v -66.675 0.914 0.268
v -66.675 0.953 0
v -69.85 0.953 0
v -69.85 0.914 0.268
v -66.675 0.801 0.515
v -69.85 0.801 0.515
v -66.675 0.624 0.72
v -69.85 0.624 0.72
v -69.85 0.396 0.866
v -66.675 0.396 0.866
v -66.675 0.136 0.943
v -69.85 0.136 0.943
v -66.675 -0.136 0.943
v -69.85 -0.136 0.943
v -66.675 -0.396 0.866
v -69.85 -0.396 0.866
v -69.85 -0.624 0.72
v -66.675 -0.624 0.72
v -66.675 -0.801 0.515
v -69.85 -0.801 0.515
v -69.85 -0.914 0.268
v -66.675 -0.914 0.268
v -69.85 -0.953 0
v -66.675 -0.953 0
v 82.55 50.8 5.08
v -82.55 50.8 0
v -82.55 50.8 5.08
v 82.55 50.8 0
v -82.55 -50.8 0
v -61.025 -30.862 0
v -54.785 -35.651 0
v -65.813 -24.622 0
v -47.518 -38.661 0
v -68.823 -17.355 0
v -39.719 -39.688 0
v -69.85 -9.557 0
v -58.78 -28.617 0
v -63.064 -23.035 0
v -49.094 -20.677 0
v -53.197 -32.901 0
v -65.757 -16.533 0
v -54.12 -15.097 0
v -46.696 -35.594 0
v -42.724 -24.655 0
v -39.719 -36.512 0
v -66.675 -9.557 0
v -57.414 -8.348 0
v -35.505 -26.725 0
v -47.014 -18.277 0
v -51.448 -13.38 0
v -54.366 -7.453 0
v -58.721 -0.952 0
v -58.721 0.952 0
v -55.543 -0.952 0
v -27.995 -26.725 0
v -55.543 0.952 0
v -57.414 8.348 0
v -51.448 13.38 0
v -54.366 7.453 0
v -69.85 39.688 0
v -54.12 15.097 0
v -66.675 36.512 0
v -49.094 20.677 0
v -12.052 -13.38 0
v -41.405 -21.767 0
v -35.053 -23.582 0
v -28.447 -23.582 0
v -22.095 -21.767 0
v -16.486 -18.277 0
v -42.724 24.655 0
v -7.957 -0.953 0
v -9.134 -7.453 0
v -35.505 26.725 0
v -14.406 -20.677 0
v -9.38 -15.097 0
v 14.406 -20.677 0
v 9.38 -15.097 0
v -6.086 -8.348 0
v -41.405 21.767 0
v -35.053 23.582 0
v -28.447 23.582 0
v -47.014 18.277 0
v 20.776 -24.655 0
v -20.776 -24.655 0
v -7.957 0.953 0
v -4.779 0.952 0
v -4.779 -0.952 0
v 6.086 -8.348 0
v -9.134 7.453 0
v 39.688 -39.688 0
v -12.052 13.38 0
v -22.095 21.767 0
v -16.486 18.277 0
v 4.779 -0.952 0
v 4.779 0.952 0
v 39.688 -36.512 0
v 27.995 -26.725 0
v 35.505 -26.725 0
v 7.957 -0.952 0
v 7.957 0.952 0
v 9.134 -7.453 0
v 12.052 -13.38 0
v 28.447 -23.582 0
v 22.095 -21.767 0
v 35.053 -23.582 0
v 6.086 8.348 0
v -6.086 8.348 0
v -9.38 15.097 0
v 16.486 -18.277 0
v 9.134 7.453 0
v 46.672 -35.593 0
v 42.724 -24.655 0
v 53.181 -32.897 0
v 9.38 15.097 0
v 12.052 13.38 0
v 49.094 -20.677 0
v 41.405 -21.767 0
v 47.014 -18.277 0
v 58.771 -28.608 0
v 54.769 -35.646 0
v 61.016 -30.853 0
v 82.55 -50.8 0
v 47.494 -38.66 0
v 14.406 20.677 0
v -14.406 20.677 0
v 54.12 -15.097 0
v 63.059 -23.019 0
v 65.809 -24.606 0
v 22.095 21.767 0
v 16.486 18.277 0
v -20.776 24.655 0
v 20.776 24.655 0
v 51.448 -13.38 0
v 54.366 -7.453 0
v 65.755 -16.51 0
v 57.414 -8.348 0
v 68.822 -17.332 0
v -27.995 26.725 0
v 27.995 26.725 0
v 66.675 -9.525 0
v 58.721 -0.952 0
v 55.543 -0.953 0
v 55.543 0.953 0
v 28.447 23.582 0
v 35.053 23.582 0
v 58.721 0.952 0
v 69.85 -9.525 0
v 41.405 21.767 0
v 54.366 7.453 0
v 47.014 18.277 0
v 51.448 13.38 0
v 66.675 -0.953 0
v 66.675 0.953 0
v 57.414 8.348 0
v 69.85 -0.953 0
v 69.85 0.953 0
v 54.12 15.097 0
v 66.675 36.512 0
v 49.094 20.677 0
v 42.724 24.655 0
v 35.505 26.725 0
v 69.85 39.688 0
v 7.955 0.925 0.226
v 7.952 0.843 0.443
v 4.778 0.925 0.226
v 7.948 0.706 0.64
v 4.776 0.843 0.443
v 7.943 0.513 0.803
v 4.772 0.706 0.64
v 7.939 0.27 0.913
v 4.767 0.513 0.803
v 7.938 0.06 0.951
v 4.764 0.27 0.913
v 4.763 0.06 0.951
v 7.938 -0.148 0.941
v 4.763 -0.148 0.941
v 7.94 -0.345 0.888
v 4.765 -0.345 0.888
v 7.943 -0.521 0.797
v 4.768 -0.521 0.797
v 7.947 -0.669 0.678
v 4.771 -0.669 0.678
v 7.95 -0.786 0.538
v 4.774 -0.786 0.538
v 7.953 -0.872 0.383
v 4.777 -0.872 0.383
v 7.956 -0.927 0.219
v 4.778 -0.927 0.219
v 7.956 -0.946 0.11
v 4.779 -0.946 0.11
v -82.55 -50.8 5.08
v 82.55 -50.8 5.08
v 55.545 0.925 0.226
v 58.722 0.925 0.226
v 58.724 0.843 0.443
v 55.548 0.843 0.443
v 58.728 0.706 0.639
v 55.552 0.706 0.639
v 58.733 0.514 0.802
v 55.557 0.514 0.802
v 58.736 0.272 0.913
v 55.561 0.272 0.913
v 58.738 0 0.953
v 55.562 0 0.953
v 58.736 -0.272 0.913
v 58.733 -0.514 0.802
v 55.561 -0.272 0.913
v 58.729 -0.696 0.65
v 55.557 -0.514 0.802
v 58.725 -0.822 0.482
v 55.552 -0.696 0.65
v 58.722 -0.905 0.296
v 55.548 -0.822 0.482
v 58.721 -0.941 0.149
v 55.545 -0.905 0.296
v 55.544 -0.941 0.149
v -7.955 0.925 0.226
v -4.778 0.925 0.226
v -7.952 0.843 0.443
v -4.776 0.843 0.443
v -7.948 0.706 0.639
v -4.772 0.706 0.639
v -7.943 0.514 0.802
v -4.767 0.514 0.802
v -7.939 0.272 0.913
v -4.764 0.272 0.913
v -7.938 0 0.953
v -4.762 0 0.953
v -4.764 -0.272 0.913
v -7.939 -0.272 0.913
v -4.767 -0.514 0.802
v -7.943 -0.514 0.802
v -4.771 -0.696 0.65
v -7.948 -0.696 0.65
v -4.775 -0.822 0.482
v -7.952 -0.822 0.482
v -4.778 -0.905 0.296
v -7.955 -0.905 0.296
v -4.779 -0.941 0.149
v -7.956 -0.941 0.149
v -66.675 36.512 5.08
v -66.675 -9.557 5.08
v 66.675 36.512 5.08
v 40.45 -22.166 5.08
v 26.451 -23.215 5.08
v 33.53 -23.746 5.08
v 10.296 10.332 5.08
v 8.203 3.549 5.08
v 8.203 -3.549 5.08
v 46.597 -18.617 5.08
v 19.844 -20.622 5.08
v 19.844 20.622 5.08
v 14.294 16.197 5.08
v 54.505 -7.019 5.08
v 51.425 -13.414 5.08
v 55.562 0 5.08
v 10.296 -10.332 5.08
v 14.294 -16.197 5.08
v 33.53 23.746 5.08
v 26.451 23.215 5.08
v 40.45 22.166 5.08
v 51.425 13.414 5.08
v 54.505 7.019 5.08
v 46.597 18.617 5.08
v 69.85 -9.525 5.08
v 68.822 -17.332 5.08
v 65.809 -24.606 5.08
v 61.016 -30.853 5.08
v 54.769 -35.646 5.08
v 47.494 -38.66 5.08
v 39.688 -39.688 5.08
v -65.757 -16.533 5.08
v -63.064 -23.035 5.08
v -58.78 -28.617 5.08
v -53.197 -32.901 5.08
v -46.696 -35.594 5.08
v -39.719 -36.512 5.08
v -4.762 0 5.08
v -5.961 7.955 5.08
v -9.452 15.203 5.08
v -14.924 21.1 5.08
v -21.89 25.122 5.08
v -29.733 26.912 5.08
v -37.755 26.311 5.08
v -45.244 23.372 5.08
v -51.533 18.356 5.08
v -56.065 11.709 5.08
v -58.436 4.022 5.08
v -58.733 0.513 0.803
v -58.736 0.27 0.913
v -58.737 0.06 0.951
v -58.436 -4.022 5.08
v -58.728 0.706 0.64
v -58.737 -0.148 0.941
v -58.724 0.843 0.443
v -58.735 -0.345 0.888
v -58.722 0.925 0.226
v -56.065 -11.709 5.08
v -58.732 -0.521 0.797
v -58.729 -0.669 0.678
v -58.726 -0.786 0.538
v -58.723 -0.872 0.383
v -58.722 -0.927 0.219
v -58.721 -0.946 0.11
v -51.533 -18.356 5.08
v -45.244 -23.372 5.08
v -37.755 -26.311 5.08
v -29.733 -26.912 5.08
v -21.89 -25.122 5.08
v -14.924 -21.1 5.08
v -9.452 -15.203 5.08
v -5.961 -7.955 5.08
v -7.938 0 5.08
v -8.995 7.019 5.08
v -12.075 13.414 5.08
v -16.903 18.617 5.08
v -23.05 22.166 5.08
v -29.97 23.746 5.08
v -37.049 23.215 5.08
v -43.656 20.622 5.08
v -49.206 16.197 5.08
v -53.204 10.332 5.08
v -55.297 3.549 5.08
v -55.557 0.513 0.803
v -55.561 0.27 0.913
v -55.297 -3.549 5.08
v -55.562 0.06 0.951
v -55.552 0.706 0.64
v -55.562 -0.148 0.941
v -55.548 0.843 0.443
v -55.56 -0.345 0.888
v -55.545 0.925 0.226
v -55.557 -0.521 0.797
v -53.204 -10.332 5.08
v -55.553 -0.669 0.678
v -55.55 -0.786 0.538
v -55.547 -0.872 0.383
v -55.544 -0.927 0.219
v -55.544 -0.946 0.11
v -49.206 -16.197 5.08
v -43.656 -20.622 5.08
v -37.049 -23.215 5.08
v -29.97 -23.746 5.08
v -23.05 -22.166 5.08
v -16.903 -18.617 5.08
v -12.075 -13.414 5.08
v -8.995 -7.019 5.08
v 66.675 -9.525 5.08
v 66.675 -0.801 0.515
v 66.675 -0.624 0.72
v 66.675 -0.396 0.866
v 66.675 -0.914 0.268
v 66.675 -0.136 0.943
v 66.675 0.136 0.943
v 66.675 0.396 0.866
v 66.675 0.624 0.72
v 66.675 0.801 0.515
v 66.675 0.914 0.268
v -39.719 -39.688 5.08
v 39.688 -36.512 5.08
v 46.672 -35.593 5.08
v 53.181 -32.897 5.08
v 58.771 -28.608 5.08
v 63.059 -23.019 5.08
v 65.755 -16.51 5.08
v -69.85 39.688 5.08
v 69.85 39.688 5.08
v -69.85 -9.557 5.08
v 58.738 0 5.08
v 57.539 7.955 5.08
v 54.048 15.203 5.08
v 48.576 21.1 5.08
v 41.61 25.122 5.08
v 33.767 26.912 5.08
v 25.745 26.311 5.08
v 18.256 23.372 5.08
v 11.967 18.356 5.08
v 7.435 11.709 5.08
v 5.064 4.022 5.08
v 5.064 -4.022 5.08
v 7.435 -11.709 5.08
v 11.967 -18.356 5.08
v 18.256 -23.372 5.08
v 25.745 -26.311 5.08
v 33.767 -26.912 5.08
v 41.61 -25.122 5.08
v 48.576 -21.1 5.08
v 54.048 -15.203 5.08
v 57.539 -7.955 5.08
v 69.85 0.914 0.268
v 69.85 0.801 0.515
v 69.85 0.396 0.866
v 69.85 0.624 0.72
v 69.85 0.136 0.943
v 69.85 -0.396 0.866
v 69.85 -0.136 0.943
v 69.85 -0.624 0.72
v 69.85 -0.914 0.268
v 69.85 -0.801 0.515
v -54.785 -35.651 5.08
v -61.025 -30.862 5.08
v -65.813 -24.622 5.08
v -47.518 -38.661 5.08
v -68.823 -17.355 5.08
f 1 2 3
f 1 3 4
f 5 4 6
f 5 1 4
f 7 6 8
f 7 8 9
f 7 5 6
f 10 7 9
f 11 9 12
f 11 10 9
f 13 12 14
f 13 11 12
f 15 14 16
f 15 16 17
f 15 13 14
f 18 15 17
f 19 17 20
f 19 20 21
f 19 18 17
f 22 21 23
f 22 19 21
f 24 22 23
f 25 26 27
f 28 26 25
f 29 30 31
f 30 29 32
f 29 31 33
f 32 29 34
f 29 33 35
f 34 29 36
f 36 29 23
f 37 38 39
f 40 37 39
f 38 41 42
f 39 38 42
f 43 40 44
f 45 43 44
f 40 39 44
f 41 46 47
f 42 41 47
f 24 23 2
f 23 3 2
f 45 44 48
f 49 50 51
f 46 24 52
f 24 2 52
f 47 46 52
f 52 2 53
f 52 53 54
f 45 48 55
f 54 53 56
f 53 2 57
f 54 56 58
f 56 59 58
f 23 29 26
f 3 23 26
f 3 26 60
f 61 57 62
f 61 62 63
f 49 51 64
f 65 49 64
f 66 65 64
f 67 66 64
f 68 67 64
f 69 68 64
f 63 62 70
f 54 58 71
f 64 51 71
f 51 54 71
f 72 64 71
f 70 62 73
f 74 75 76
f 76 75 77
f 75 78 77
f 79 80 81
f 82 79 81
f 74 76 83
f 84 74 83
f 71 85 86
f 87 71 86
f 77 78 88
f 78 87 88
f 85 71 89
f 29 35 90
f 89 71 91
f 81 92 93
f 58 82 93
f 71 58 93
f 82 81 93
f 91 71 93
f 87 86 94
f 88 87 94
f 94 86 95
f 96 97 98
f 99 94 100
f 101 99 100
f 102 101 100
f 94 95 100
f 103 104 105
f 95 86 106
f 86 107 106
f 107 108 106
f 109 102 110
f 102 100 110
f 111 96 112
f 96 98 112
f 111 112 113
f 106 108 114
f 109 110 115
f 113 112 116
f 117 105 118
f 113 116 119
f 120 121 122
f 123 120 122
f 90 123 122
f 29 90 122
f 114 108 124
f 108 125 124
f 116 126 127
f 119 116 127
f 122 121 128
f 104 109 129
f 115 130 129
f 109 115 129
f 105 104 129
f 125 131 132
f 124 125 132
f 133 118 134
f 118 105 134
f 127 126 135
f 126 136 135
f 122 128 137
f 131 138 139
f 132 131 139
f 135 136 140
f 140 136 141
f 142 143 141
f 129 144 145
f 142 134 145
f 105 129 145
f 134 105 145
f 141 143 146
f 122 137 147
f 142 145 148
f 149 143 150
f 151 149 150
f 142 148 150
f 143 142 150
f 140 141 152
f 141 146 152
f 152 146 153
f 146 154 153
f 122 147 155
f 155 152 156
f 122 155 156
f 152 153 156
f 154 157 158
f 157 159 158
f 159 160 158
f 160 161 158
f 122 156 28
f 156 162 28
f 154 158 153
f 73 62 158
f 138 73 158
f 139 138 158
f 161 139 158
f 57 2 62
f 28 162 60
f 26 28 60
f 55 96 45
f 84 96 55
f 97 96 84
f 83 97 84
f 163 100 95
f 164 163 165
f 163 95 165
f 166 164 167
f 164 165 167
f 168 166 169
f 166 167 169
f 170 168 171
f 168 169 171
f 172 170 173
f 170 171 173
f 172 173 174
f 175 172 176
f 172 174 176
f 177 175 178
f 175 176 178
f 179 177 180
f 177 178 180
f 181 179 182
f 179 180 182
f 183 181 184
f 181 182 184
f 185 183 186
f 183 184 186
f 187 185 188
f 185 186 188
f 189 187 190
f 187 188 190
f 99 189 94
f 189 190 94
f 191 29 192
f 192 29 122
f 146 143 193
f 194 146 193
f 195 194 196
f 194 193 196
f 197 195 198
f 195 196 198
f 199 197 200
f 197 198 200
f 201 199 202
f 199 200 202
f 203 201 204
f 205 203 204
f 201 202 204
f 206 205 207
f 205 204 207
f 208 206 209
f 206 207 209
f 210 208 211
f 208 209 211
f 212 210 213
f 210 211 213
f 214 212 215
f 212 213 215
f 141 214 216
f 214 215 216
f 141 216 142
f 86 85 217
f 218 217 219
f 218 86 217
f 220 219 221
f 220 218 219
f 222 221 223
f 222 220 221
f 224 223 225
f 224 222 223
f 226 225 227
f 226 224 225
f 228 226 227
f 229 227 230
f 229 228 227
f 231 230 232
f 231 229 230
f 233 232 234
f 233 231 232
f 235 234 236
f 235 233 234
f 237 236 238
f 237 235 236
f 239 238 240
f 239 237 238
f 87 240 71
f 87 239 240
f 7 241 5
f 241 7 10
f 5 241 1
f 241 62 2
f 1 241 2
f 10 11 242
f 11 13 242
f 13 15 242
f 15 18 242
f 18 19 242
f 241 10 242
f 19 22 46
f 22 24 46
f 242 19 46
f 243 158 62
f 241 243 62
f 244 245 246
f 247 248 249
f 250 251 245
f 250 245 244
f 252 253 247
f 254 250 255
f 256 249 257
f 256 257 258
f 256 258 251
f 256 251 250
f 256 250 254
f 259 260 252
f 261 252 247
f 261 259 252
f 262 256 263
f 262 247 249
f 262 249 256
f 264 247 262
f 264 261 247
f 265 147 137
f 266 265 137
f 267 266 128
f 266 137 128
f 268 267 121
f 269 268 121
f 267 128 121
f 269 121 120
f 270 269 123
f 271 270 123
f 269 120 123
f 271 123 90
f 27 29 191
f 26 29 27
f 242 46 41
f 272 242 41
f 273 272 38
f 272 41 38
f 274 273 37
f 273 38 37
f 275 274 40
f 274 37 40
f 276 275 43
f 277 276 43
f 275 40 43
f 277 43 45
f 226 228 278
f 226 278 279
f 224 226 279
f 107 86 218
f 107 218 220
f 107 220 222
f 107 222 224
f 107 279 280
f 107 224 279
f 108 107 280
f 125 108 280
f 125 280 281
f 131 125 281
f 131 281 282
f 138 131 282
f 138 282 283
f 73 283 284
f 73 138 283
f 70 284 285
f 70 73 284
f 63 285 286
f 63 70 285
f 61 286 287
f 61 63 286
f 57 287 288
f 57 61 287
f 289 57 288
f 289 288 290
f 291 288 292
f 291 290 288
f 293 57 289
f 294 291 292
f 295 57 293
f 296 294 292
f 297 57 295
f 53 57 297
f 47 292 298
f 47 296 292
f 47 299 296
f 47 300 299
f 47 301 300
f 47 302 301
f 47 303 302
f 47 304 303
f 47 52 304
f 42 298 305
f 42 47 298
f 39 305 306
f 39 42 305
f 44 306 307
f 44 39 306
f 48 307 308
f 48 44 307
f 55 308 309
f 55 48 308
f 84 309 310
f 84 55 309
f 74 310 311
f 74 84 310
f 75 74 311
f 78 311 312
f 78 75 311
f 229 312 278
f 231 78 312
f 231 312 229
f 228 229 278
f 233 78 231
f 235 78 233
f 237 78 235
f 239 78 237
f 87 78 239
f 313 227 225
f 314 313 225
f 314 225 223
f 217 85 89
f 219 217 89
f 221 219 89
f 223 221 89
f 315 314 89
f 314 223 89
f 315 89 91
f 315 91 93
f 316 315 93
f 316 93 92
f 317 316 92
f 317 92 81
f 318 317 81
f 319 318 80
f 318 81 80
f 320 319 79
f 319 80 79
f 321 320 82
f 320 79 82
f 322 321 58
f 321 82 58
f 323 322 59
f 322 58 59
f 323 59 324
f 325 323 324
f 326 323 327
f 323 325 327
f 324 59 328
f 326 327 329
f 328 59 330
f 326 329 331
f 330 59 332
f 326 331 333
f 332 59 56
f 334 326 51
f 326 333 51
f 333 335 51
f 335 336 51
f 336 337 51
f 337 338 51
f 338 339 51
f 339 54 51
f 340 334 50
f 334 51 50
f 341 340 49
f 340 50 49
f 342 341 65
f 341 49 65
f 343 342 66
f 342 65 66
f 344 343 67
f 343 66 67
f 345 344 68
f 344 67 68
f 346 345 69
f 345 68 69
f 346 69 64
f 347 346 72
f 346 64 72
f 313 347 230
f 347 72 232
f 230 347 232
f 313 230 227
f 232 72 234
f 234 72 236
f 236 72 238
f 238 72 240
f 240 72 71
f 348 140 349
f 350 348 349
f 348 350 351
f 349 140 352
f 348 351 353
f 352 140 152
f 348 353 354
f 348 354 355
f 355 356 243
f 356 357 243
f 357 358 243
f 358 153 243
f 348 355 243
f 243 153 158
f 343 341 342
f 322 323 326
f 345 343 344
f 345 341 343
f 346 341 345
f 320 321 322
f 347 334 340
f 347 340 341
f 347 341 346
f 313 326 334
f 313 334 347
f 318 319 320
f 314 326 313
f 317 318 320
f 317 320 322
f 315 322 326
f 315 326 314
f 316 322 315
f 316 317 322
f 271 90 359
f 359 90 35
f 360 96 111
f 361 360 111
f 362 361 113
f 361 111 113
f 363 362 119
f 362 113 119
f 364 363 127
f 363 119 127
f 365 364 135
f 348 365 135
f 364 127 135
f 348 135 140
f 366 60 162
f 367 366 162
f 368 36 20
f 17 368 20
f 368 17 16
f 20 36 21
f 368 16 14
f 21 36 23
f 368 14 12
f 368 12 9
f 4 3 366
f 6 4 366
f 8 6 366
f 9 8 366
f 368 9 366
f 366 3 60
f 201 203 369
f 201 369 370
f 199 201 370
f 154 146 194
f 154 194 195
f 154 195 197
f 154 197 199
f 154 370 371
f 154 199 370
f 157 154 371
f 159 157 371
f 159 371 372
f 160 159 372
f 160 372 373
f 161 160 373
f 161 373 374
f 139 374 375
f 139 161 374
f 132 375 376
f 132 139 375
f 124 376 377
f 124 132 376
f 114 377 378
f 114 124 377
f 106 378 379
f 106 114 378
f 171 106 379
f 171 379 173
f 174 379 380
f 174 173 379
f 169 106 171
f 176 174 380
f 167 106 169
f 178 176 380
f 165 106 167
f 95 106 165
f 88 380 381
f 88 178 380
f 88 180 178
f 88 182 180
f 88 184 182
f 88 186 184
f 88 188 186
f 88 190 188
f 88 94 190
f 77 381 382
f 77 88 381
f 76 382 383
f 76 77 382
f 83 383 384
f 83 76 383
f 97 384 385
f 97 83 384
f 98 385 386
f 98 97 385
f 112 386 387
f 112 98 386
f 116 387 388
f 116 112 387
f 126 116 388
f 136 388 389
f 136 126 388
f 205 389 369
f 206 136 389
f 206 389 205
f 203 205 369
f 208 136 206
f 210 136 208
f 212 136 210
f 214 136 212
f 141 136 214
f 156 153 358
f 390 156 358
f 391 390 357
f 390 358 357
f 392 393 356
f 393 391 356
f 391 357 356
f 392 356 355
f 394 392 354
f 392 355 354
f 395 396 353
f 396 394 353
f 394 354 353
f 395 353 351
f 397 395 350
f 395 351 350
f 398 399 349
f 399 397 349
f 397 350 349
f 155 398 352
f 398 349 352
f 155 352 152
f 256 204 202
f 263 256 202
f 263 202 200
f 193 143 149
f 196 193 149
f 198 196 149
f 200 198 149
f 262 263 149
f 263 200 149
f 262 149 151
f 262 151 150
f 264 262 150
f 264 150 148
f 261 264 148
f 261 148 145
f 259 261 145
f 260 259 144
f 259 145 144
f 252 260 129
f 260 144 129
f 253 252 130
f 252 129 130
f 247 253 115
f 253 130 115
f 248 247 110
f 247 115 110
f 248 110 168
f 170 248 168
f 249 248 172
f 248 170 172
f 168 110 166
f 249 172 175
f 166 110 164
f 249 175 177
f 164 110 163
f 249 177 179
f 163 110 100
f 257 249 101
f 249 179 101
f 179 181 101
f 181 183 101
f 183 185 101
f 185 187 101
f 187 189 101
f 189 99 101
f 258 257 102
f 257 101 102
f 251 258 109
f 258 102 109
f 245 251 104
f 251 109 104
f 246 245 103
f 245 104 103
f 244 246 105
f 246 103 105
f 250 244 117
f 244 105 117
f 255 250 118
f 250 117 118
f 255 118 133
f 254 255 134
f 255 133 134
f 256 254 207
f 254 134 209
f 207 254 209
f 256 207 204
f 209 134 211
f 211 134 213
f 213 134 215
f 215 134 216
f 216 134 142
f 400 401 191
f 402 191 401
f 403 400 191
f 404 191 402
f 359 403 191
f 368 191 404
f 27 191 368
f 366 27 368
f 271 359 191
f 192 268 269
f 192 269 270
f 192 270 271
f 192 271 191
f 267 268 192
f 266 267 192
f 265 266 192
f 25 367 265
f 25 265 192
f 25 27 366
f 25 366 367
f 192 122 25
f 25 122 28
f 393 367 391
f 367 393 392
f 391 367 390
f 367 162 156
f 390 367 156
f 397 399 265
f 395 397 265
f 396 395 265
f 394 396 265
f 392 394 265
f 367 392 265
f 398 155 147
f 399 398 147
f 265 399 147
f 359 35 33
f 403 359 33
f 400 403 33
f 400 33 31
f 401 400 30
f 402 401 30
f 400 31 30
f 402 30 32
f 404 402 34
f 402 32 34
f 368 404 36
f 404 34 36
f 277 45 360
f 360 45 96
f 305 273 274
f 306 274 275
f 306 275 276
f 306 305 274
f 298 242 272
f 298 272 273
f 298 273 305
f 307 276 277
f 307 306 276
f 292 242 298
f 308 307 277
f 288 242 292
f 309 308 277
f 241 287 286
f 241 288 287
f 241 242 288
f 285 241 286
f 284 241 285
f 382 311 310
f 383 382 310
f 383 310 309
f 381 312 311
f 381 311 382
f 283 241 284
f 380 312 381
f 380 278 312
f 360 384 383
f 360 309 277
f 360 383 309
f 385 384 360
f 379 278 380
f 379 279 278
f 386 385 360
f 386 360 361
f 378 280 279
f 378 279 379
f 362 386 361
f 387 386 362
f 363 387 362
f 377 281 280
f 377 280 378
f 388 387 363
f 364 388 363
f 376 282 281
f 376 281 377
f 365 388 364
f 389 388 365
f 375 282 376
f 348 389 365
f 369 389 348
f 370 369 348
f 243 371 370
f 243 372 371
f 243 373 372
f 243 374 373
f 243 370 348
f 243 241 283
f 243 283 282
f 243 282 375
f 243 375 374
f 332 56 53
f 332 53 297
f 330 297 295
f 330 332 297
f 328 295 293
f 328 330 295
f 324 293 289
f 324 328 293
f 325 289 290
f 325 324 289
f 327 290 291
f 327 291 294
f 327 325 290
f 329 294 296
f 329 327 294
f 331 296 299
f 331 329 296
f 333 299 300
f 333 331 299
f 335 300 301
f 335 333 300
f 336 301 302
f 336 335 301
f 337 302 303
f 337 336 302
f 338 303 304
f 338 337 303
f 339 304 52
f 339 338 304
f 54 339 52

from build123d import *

# Parameters (mm, degrees)
F0_R          = 26.9875
F1_DEPTH      = 5.08
F0_R_2        = 23.8125
F0_W          = 165.1
F0_H          = 101.6
F3_DEPTH      = 76.2
F3_DEPTH_BACK = 76.2


with BuildPart() as f1:
    # F0 (on Top) → F1 (new body)
    with BuildSketch(Plane.XY):
        with BuildLine():
            Line((66.675, 36.5125), (-66.675, 36.5125))
            Line((-66.675, 36.5125), (-66.675, -9.55675))
            ThreePointArc((-66.675, -9.55675), (-58.779843617, -28.617343617), (-39.71925, -36.5125))
            Line((-39.71925, -36.5125), (39.6875, -36.5125))
            ThreePointArc((39.6875, -36.5125), (58.7705442573, -28.6080442573), (66.675, -9.525))
            Line((66.675, -9.525), (66.675, 36.5125))
        make_face()
        with Locations((-31.75, 0)):
            Circle(F0_R, mode=Mode.SUBTRACT)
        with Locations((31.75, 0)):
            Circle(F0_R, mode=Mode.SUBTRACT)
    extrude(amount=F1_DEPTH)



with BuildPart() as f1b:
    # F0 (on Top) → F1, piece 2 (new body)
    with BuildSketch(Plane.XY):
        with Locations((-31.75, 0)):
            Circle(F0_R_2)
    extrude(amount=F1_DEPTH)


with BuildPart() as f1c:
    # F0 (on Top) → F1, piece 3 (new body)
    with BuildSketch(Plane.XY):
        with Locations((31.75, 0)):
            Circle(F0_R_2)
    extrude(amount=F1_DEPTH)


with BuildPart() as f1d:
    # F0 (on Top) → F1, piece 4 (new body)
    with BuildSketch(Plane.XY):
        Rectangle(F0_W, F0_H)
        with BuildLine():
            Line((-73.025, -9.55675), (-73.025, 42.8625))
            Line((-73.025, 42.8625), (73.025, 42.8625))
            Line((73.025, 42.8625), (73.025, -9.525))
            ThreePointArc((73.025, -9.525), (63.2606723178, -33.0981723178), (39.6875, -42.8625))
            Line((39.6875, -42.8625), (-39.71925, -42.8625))
            ThreePointArc((-39.71925, -42.8625), (-63.2699716775, -33.1074716775), (-73.025, -9.55675))
        make_face(mode=Mode.SUBTRACT)
        with BuildLine():
            Line((73.025, 42.8625), (-73.025, 42.8625))
            Line((-73.025, 42.8625), (-73.025, -9.55675))
            ThreePointArc((-73.025, -9.55675), (-63.2699716775, -33.1074716775), (-39.71925, -42.8625))
            Line((-39.71925, -42.8625), (39.6875, -42.8625))
            ThreePointArc((39.6875, -42.8625), (63.2606723178, -33.0981723178), (73.025, -9.525))
            Line((73.025, -9.525), (73.025, 42.8625))
        make_face()
        with BuildLine():
            Line((-69.85, -9.55675), (-69.85, 39.6875))
            Line((-69.85, 39.6875), (69.85, 39.6875))
            Line((69.85, 39.6875), (69.85, -9.525))
            ThreePointArc((69.85, -9.525), (61.0156082875, -30.8531082875), (39.6875, -39.6875))
            Line((39.6875, -39.6875), (-39.71925, -39.6875))
            ThreePointArc((-39.71925, -39.6875), (-61.0249076472, -30.8624076472), (-69.85, -9.55675))
        make_face(mode=Mode.SUBTRACT)
    extrude(amount=F1_DEPTH)


with BuildPart() as f1_1:
    add(f1.part)

    add(f1b.part)  # F3 merges F1b

    add(f1c.part)  # F3 merges F1c

    add(f1d.part)  # F3 merges F1d
    # F2 (on Right) → F3 (join, two sides)
    with BuildSketch(Plane.YZ) as f3_sk:
        with BuildLine():
            Line((-0.9525, 0), (0.9525, 0))
            ThreePointArc((0.9525, 0), (0, 0.9525), (-0.9525, 0))
        make_face()
    extrude(amount=F3_DEPTH)
    extrude(f3_sk.sketch, amount=-F3_DEPTH_BACK)


solid = f1_1.part
